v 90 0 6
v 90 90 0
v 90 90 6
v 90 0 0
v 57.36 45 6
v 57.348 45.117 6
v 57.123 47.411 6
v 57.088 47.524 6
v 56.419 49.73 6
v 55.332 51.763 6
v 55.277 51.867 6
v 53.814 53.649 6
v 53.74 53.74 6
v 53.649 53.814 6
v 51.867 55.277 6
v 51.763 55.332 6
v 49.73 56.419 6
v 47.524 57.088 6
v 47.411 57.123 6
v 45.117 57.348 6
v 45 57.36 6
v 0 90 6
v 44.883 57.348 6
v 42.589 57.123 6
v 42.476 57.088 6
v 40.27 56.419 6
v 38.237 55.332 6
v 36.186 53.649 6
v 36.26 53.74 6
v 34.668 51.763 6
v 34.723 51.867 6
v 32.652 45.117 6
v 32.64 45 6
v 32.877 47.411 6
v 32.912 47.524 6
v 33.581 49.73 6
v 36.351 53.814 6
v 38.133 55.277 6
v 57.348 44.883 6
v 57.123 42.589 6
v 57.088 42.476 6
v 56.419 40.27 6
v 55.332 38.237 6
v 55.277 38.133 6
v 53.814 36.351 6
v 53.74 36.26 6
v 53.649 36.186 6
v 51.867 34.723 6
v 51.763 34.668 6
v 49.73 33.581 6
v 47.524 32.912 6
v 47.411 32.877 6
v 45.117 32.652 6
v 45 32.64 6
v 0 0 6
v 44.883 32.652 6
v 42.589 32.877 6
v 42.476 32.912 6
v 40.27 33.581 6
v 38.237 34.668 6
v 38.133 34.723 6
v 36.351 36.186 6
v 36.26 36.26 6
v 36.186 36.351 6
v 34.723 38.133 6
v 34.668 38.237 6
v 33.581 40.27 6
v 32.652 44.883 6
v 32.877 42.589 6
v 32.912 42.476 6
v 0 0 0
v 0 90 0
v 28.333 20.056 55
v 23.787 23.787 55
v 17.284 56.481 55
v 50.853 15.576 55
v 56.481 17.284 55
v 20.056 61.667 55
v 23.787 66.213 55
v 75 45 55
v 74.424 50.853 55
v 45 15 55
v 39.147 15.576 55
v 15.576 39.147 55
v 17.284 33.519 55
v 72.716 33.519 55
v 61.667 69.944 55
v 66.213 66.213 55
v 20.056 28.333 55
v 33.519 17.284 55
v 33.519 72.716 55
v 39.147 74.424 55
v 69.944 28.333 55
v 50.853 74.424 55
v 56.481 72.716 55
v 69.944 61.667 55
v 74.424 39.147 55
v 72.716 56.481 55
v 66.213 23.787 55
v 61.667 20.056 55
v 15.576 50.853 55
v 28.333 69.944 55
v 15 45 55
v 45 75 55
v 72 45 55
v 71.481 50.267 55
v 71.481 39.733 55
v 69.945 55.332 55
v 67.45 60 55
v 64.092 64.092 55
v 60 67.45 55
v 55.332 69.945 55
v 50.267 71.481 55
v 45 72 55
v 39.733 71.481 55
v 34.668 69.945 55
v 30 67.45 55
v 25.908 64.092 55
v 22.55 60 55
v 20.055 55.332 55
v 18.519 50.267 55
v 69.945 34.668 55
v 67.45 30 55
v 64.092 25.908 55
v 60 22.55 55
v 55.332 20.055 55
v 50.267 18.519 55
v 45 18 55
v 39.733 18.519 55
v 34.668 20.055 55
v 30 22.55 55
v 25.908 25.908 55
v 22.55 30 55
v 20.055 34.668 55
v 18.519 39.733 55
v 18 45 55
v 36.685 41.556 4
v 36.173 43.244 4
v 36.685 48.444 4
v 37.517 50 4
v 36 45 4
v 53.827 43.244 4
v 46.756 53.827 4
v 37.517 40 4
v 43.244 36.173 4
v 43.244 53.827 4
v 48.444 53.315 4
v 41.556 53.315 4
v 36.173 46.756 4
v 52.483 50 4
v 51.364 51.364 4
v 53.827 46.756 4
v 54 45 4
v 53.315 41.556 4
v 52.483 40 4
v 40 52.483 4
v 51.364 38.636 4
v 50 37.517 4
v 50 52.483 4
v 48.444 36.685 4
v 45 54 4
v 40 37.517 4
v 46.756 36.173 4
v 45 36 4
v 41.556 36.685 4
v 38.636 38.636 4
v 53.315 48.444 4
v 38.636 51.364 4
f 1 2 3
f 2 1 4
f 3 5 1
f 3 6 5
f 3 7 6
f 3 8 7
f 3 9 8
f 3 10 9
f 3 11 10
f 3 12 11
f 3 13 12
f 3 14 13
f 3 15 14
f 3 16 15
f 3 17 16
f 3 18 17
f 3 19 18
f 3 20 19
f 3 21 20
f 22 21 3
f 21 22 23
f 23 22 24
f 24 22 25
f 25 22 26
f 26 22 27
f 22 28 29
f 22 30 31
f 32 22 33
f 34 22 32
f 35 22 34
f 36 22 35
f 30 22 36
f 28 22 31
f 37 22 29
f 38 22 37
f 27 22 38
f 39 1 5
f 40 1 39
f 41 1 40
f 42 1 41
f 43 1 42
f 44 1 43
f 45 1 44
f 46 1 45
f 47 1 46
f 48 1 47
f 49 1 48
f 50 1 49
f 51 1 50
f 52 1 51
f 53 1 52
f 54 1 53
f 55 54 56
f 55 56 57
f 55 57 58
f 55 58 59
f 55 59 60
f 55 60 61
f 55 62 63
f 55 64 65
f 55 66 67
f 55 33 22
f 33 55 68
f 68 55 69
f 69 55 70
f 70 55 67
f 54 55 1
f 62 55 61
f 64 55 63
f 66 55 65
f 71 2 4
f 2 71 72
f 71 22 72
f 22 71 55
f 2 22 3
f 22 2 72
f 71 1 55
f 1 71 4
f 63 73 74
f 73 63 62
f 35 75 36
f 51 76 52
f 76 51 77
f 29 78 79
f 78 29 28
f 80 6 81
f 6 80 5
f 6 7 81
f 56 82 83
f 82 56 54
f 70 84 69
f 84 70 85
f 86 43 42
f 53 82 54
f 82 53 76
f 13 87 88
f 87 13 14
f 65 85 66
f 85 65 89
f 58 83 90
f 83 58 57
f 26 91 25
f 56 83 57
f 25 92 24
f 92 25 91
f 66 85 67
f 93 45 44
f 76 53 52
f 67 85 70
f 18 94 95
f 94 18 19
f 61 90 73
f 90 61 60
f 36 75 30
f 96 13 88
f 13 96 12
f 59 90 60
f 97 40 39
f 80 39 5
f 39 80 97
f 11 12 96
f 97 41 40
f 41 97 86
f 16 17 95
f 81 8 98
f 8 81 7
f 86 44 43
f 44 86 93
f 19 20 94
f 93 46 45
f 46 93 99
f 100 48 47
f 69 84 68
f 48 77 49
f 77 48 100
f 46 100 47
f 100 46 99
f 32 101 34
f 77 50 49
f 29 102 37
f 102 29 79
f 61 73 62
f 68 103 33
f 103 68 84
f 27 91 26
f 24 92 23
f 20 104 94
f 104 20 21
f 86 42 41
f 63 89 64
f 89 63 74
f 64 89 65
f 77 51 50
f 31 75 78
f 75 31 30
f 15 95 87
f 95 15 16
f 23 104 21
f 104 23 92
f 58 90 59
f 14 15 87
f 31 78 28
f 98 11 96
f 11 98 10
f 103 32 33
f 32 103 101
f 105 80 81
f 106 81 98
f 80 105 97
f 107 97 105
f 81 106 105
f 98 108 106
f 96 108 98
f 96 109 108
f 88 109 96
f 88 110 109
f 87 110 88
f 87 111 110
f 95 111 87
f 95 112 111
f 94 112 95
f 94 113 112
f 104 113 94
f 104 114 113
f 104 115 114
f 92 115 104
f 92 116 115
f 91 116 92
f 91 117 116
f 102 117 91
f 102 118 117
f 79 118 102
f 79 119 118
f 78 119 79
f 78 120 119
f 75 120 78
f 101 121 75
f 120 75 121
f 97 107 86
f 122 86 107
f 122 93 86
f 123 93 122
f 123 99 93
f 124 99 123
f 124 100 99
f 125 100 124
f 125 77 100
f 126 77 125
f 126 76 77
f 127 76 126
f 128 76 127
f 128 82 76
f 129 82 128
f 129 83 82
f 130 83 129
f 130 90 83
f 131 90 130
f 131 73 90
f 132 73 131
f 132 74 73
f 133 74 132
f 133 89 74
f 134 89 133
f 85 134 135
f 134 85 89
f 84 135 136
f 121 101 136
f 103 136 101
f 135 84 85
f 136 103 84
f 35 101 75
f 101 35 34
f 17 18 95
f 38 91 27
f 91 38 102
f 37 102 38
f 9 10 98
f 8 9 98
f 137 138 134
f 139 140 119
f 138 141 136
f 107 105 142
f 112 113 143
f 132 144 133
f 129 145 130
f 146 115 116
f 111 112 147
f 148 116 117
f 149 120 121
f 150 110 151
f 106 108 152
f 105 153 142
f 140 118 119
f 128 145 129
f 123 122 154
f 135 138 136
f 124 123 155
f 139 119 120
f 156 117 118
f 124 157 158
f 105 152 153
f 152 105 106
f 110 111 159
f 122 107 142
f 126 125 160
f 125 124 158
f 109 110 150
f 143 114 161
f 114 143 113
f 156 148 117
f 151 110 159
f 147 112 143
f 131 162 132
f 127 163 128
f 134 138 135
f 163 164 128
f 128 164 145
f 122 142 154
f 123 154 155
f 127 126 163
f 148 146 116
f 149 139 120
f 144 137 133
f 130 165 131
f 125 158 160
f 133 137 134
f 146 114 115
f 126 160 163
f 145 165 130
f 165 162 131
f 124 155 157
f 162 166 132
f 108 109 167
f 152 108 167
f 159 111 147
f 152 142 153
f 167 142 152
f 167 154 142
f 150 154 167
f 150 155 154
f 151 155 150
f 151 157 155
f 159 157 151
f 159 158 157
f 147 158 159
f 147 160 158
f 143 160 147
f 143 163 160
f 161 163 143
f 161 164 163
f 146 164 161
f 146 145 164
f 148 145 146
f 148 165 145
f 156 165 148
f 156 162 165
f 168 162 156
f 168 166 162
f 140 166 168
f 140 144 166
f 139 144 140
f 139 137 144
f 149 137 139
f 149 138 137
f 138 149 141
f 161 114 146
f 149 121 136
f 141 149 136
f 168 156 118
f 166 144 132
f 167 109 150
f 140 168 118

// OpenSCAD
$fn = 32;

// ----------------------------------------------------------------------
// Hopper: funnel with square flange
// ----------------------------------------------------------------------

// --- parameters (mm) ---
fl = 90;                  // flange side, X and Y
fl_t = 6;                 // flange thickness
cone_h = 50;              // cone height above the flange
top_d = 60;               // cone mouth diameter
bot_d = 24;               // cone spout diameter
wall = 3;                 // cone wall thickness

bore_d = bot_d - 2 * wall;  // spout bore diameter
total_h = fl_t + cone_h - 1;  // overall height

difference() {
  union() {
    cube([fl, fl, fl_t]);
    translate([fl / 2, fl / 2, fl_t - 1])
      cylinder(h = cone_h, d1 = bot_d, d2 = top_d);
  }
  translate([fl / 2, fl / 2, fl_t - 2])
    cylinder(h = cone_h + 1, d1 = bore_d, d2 = top_d - 2 * wall);
}
